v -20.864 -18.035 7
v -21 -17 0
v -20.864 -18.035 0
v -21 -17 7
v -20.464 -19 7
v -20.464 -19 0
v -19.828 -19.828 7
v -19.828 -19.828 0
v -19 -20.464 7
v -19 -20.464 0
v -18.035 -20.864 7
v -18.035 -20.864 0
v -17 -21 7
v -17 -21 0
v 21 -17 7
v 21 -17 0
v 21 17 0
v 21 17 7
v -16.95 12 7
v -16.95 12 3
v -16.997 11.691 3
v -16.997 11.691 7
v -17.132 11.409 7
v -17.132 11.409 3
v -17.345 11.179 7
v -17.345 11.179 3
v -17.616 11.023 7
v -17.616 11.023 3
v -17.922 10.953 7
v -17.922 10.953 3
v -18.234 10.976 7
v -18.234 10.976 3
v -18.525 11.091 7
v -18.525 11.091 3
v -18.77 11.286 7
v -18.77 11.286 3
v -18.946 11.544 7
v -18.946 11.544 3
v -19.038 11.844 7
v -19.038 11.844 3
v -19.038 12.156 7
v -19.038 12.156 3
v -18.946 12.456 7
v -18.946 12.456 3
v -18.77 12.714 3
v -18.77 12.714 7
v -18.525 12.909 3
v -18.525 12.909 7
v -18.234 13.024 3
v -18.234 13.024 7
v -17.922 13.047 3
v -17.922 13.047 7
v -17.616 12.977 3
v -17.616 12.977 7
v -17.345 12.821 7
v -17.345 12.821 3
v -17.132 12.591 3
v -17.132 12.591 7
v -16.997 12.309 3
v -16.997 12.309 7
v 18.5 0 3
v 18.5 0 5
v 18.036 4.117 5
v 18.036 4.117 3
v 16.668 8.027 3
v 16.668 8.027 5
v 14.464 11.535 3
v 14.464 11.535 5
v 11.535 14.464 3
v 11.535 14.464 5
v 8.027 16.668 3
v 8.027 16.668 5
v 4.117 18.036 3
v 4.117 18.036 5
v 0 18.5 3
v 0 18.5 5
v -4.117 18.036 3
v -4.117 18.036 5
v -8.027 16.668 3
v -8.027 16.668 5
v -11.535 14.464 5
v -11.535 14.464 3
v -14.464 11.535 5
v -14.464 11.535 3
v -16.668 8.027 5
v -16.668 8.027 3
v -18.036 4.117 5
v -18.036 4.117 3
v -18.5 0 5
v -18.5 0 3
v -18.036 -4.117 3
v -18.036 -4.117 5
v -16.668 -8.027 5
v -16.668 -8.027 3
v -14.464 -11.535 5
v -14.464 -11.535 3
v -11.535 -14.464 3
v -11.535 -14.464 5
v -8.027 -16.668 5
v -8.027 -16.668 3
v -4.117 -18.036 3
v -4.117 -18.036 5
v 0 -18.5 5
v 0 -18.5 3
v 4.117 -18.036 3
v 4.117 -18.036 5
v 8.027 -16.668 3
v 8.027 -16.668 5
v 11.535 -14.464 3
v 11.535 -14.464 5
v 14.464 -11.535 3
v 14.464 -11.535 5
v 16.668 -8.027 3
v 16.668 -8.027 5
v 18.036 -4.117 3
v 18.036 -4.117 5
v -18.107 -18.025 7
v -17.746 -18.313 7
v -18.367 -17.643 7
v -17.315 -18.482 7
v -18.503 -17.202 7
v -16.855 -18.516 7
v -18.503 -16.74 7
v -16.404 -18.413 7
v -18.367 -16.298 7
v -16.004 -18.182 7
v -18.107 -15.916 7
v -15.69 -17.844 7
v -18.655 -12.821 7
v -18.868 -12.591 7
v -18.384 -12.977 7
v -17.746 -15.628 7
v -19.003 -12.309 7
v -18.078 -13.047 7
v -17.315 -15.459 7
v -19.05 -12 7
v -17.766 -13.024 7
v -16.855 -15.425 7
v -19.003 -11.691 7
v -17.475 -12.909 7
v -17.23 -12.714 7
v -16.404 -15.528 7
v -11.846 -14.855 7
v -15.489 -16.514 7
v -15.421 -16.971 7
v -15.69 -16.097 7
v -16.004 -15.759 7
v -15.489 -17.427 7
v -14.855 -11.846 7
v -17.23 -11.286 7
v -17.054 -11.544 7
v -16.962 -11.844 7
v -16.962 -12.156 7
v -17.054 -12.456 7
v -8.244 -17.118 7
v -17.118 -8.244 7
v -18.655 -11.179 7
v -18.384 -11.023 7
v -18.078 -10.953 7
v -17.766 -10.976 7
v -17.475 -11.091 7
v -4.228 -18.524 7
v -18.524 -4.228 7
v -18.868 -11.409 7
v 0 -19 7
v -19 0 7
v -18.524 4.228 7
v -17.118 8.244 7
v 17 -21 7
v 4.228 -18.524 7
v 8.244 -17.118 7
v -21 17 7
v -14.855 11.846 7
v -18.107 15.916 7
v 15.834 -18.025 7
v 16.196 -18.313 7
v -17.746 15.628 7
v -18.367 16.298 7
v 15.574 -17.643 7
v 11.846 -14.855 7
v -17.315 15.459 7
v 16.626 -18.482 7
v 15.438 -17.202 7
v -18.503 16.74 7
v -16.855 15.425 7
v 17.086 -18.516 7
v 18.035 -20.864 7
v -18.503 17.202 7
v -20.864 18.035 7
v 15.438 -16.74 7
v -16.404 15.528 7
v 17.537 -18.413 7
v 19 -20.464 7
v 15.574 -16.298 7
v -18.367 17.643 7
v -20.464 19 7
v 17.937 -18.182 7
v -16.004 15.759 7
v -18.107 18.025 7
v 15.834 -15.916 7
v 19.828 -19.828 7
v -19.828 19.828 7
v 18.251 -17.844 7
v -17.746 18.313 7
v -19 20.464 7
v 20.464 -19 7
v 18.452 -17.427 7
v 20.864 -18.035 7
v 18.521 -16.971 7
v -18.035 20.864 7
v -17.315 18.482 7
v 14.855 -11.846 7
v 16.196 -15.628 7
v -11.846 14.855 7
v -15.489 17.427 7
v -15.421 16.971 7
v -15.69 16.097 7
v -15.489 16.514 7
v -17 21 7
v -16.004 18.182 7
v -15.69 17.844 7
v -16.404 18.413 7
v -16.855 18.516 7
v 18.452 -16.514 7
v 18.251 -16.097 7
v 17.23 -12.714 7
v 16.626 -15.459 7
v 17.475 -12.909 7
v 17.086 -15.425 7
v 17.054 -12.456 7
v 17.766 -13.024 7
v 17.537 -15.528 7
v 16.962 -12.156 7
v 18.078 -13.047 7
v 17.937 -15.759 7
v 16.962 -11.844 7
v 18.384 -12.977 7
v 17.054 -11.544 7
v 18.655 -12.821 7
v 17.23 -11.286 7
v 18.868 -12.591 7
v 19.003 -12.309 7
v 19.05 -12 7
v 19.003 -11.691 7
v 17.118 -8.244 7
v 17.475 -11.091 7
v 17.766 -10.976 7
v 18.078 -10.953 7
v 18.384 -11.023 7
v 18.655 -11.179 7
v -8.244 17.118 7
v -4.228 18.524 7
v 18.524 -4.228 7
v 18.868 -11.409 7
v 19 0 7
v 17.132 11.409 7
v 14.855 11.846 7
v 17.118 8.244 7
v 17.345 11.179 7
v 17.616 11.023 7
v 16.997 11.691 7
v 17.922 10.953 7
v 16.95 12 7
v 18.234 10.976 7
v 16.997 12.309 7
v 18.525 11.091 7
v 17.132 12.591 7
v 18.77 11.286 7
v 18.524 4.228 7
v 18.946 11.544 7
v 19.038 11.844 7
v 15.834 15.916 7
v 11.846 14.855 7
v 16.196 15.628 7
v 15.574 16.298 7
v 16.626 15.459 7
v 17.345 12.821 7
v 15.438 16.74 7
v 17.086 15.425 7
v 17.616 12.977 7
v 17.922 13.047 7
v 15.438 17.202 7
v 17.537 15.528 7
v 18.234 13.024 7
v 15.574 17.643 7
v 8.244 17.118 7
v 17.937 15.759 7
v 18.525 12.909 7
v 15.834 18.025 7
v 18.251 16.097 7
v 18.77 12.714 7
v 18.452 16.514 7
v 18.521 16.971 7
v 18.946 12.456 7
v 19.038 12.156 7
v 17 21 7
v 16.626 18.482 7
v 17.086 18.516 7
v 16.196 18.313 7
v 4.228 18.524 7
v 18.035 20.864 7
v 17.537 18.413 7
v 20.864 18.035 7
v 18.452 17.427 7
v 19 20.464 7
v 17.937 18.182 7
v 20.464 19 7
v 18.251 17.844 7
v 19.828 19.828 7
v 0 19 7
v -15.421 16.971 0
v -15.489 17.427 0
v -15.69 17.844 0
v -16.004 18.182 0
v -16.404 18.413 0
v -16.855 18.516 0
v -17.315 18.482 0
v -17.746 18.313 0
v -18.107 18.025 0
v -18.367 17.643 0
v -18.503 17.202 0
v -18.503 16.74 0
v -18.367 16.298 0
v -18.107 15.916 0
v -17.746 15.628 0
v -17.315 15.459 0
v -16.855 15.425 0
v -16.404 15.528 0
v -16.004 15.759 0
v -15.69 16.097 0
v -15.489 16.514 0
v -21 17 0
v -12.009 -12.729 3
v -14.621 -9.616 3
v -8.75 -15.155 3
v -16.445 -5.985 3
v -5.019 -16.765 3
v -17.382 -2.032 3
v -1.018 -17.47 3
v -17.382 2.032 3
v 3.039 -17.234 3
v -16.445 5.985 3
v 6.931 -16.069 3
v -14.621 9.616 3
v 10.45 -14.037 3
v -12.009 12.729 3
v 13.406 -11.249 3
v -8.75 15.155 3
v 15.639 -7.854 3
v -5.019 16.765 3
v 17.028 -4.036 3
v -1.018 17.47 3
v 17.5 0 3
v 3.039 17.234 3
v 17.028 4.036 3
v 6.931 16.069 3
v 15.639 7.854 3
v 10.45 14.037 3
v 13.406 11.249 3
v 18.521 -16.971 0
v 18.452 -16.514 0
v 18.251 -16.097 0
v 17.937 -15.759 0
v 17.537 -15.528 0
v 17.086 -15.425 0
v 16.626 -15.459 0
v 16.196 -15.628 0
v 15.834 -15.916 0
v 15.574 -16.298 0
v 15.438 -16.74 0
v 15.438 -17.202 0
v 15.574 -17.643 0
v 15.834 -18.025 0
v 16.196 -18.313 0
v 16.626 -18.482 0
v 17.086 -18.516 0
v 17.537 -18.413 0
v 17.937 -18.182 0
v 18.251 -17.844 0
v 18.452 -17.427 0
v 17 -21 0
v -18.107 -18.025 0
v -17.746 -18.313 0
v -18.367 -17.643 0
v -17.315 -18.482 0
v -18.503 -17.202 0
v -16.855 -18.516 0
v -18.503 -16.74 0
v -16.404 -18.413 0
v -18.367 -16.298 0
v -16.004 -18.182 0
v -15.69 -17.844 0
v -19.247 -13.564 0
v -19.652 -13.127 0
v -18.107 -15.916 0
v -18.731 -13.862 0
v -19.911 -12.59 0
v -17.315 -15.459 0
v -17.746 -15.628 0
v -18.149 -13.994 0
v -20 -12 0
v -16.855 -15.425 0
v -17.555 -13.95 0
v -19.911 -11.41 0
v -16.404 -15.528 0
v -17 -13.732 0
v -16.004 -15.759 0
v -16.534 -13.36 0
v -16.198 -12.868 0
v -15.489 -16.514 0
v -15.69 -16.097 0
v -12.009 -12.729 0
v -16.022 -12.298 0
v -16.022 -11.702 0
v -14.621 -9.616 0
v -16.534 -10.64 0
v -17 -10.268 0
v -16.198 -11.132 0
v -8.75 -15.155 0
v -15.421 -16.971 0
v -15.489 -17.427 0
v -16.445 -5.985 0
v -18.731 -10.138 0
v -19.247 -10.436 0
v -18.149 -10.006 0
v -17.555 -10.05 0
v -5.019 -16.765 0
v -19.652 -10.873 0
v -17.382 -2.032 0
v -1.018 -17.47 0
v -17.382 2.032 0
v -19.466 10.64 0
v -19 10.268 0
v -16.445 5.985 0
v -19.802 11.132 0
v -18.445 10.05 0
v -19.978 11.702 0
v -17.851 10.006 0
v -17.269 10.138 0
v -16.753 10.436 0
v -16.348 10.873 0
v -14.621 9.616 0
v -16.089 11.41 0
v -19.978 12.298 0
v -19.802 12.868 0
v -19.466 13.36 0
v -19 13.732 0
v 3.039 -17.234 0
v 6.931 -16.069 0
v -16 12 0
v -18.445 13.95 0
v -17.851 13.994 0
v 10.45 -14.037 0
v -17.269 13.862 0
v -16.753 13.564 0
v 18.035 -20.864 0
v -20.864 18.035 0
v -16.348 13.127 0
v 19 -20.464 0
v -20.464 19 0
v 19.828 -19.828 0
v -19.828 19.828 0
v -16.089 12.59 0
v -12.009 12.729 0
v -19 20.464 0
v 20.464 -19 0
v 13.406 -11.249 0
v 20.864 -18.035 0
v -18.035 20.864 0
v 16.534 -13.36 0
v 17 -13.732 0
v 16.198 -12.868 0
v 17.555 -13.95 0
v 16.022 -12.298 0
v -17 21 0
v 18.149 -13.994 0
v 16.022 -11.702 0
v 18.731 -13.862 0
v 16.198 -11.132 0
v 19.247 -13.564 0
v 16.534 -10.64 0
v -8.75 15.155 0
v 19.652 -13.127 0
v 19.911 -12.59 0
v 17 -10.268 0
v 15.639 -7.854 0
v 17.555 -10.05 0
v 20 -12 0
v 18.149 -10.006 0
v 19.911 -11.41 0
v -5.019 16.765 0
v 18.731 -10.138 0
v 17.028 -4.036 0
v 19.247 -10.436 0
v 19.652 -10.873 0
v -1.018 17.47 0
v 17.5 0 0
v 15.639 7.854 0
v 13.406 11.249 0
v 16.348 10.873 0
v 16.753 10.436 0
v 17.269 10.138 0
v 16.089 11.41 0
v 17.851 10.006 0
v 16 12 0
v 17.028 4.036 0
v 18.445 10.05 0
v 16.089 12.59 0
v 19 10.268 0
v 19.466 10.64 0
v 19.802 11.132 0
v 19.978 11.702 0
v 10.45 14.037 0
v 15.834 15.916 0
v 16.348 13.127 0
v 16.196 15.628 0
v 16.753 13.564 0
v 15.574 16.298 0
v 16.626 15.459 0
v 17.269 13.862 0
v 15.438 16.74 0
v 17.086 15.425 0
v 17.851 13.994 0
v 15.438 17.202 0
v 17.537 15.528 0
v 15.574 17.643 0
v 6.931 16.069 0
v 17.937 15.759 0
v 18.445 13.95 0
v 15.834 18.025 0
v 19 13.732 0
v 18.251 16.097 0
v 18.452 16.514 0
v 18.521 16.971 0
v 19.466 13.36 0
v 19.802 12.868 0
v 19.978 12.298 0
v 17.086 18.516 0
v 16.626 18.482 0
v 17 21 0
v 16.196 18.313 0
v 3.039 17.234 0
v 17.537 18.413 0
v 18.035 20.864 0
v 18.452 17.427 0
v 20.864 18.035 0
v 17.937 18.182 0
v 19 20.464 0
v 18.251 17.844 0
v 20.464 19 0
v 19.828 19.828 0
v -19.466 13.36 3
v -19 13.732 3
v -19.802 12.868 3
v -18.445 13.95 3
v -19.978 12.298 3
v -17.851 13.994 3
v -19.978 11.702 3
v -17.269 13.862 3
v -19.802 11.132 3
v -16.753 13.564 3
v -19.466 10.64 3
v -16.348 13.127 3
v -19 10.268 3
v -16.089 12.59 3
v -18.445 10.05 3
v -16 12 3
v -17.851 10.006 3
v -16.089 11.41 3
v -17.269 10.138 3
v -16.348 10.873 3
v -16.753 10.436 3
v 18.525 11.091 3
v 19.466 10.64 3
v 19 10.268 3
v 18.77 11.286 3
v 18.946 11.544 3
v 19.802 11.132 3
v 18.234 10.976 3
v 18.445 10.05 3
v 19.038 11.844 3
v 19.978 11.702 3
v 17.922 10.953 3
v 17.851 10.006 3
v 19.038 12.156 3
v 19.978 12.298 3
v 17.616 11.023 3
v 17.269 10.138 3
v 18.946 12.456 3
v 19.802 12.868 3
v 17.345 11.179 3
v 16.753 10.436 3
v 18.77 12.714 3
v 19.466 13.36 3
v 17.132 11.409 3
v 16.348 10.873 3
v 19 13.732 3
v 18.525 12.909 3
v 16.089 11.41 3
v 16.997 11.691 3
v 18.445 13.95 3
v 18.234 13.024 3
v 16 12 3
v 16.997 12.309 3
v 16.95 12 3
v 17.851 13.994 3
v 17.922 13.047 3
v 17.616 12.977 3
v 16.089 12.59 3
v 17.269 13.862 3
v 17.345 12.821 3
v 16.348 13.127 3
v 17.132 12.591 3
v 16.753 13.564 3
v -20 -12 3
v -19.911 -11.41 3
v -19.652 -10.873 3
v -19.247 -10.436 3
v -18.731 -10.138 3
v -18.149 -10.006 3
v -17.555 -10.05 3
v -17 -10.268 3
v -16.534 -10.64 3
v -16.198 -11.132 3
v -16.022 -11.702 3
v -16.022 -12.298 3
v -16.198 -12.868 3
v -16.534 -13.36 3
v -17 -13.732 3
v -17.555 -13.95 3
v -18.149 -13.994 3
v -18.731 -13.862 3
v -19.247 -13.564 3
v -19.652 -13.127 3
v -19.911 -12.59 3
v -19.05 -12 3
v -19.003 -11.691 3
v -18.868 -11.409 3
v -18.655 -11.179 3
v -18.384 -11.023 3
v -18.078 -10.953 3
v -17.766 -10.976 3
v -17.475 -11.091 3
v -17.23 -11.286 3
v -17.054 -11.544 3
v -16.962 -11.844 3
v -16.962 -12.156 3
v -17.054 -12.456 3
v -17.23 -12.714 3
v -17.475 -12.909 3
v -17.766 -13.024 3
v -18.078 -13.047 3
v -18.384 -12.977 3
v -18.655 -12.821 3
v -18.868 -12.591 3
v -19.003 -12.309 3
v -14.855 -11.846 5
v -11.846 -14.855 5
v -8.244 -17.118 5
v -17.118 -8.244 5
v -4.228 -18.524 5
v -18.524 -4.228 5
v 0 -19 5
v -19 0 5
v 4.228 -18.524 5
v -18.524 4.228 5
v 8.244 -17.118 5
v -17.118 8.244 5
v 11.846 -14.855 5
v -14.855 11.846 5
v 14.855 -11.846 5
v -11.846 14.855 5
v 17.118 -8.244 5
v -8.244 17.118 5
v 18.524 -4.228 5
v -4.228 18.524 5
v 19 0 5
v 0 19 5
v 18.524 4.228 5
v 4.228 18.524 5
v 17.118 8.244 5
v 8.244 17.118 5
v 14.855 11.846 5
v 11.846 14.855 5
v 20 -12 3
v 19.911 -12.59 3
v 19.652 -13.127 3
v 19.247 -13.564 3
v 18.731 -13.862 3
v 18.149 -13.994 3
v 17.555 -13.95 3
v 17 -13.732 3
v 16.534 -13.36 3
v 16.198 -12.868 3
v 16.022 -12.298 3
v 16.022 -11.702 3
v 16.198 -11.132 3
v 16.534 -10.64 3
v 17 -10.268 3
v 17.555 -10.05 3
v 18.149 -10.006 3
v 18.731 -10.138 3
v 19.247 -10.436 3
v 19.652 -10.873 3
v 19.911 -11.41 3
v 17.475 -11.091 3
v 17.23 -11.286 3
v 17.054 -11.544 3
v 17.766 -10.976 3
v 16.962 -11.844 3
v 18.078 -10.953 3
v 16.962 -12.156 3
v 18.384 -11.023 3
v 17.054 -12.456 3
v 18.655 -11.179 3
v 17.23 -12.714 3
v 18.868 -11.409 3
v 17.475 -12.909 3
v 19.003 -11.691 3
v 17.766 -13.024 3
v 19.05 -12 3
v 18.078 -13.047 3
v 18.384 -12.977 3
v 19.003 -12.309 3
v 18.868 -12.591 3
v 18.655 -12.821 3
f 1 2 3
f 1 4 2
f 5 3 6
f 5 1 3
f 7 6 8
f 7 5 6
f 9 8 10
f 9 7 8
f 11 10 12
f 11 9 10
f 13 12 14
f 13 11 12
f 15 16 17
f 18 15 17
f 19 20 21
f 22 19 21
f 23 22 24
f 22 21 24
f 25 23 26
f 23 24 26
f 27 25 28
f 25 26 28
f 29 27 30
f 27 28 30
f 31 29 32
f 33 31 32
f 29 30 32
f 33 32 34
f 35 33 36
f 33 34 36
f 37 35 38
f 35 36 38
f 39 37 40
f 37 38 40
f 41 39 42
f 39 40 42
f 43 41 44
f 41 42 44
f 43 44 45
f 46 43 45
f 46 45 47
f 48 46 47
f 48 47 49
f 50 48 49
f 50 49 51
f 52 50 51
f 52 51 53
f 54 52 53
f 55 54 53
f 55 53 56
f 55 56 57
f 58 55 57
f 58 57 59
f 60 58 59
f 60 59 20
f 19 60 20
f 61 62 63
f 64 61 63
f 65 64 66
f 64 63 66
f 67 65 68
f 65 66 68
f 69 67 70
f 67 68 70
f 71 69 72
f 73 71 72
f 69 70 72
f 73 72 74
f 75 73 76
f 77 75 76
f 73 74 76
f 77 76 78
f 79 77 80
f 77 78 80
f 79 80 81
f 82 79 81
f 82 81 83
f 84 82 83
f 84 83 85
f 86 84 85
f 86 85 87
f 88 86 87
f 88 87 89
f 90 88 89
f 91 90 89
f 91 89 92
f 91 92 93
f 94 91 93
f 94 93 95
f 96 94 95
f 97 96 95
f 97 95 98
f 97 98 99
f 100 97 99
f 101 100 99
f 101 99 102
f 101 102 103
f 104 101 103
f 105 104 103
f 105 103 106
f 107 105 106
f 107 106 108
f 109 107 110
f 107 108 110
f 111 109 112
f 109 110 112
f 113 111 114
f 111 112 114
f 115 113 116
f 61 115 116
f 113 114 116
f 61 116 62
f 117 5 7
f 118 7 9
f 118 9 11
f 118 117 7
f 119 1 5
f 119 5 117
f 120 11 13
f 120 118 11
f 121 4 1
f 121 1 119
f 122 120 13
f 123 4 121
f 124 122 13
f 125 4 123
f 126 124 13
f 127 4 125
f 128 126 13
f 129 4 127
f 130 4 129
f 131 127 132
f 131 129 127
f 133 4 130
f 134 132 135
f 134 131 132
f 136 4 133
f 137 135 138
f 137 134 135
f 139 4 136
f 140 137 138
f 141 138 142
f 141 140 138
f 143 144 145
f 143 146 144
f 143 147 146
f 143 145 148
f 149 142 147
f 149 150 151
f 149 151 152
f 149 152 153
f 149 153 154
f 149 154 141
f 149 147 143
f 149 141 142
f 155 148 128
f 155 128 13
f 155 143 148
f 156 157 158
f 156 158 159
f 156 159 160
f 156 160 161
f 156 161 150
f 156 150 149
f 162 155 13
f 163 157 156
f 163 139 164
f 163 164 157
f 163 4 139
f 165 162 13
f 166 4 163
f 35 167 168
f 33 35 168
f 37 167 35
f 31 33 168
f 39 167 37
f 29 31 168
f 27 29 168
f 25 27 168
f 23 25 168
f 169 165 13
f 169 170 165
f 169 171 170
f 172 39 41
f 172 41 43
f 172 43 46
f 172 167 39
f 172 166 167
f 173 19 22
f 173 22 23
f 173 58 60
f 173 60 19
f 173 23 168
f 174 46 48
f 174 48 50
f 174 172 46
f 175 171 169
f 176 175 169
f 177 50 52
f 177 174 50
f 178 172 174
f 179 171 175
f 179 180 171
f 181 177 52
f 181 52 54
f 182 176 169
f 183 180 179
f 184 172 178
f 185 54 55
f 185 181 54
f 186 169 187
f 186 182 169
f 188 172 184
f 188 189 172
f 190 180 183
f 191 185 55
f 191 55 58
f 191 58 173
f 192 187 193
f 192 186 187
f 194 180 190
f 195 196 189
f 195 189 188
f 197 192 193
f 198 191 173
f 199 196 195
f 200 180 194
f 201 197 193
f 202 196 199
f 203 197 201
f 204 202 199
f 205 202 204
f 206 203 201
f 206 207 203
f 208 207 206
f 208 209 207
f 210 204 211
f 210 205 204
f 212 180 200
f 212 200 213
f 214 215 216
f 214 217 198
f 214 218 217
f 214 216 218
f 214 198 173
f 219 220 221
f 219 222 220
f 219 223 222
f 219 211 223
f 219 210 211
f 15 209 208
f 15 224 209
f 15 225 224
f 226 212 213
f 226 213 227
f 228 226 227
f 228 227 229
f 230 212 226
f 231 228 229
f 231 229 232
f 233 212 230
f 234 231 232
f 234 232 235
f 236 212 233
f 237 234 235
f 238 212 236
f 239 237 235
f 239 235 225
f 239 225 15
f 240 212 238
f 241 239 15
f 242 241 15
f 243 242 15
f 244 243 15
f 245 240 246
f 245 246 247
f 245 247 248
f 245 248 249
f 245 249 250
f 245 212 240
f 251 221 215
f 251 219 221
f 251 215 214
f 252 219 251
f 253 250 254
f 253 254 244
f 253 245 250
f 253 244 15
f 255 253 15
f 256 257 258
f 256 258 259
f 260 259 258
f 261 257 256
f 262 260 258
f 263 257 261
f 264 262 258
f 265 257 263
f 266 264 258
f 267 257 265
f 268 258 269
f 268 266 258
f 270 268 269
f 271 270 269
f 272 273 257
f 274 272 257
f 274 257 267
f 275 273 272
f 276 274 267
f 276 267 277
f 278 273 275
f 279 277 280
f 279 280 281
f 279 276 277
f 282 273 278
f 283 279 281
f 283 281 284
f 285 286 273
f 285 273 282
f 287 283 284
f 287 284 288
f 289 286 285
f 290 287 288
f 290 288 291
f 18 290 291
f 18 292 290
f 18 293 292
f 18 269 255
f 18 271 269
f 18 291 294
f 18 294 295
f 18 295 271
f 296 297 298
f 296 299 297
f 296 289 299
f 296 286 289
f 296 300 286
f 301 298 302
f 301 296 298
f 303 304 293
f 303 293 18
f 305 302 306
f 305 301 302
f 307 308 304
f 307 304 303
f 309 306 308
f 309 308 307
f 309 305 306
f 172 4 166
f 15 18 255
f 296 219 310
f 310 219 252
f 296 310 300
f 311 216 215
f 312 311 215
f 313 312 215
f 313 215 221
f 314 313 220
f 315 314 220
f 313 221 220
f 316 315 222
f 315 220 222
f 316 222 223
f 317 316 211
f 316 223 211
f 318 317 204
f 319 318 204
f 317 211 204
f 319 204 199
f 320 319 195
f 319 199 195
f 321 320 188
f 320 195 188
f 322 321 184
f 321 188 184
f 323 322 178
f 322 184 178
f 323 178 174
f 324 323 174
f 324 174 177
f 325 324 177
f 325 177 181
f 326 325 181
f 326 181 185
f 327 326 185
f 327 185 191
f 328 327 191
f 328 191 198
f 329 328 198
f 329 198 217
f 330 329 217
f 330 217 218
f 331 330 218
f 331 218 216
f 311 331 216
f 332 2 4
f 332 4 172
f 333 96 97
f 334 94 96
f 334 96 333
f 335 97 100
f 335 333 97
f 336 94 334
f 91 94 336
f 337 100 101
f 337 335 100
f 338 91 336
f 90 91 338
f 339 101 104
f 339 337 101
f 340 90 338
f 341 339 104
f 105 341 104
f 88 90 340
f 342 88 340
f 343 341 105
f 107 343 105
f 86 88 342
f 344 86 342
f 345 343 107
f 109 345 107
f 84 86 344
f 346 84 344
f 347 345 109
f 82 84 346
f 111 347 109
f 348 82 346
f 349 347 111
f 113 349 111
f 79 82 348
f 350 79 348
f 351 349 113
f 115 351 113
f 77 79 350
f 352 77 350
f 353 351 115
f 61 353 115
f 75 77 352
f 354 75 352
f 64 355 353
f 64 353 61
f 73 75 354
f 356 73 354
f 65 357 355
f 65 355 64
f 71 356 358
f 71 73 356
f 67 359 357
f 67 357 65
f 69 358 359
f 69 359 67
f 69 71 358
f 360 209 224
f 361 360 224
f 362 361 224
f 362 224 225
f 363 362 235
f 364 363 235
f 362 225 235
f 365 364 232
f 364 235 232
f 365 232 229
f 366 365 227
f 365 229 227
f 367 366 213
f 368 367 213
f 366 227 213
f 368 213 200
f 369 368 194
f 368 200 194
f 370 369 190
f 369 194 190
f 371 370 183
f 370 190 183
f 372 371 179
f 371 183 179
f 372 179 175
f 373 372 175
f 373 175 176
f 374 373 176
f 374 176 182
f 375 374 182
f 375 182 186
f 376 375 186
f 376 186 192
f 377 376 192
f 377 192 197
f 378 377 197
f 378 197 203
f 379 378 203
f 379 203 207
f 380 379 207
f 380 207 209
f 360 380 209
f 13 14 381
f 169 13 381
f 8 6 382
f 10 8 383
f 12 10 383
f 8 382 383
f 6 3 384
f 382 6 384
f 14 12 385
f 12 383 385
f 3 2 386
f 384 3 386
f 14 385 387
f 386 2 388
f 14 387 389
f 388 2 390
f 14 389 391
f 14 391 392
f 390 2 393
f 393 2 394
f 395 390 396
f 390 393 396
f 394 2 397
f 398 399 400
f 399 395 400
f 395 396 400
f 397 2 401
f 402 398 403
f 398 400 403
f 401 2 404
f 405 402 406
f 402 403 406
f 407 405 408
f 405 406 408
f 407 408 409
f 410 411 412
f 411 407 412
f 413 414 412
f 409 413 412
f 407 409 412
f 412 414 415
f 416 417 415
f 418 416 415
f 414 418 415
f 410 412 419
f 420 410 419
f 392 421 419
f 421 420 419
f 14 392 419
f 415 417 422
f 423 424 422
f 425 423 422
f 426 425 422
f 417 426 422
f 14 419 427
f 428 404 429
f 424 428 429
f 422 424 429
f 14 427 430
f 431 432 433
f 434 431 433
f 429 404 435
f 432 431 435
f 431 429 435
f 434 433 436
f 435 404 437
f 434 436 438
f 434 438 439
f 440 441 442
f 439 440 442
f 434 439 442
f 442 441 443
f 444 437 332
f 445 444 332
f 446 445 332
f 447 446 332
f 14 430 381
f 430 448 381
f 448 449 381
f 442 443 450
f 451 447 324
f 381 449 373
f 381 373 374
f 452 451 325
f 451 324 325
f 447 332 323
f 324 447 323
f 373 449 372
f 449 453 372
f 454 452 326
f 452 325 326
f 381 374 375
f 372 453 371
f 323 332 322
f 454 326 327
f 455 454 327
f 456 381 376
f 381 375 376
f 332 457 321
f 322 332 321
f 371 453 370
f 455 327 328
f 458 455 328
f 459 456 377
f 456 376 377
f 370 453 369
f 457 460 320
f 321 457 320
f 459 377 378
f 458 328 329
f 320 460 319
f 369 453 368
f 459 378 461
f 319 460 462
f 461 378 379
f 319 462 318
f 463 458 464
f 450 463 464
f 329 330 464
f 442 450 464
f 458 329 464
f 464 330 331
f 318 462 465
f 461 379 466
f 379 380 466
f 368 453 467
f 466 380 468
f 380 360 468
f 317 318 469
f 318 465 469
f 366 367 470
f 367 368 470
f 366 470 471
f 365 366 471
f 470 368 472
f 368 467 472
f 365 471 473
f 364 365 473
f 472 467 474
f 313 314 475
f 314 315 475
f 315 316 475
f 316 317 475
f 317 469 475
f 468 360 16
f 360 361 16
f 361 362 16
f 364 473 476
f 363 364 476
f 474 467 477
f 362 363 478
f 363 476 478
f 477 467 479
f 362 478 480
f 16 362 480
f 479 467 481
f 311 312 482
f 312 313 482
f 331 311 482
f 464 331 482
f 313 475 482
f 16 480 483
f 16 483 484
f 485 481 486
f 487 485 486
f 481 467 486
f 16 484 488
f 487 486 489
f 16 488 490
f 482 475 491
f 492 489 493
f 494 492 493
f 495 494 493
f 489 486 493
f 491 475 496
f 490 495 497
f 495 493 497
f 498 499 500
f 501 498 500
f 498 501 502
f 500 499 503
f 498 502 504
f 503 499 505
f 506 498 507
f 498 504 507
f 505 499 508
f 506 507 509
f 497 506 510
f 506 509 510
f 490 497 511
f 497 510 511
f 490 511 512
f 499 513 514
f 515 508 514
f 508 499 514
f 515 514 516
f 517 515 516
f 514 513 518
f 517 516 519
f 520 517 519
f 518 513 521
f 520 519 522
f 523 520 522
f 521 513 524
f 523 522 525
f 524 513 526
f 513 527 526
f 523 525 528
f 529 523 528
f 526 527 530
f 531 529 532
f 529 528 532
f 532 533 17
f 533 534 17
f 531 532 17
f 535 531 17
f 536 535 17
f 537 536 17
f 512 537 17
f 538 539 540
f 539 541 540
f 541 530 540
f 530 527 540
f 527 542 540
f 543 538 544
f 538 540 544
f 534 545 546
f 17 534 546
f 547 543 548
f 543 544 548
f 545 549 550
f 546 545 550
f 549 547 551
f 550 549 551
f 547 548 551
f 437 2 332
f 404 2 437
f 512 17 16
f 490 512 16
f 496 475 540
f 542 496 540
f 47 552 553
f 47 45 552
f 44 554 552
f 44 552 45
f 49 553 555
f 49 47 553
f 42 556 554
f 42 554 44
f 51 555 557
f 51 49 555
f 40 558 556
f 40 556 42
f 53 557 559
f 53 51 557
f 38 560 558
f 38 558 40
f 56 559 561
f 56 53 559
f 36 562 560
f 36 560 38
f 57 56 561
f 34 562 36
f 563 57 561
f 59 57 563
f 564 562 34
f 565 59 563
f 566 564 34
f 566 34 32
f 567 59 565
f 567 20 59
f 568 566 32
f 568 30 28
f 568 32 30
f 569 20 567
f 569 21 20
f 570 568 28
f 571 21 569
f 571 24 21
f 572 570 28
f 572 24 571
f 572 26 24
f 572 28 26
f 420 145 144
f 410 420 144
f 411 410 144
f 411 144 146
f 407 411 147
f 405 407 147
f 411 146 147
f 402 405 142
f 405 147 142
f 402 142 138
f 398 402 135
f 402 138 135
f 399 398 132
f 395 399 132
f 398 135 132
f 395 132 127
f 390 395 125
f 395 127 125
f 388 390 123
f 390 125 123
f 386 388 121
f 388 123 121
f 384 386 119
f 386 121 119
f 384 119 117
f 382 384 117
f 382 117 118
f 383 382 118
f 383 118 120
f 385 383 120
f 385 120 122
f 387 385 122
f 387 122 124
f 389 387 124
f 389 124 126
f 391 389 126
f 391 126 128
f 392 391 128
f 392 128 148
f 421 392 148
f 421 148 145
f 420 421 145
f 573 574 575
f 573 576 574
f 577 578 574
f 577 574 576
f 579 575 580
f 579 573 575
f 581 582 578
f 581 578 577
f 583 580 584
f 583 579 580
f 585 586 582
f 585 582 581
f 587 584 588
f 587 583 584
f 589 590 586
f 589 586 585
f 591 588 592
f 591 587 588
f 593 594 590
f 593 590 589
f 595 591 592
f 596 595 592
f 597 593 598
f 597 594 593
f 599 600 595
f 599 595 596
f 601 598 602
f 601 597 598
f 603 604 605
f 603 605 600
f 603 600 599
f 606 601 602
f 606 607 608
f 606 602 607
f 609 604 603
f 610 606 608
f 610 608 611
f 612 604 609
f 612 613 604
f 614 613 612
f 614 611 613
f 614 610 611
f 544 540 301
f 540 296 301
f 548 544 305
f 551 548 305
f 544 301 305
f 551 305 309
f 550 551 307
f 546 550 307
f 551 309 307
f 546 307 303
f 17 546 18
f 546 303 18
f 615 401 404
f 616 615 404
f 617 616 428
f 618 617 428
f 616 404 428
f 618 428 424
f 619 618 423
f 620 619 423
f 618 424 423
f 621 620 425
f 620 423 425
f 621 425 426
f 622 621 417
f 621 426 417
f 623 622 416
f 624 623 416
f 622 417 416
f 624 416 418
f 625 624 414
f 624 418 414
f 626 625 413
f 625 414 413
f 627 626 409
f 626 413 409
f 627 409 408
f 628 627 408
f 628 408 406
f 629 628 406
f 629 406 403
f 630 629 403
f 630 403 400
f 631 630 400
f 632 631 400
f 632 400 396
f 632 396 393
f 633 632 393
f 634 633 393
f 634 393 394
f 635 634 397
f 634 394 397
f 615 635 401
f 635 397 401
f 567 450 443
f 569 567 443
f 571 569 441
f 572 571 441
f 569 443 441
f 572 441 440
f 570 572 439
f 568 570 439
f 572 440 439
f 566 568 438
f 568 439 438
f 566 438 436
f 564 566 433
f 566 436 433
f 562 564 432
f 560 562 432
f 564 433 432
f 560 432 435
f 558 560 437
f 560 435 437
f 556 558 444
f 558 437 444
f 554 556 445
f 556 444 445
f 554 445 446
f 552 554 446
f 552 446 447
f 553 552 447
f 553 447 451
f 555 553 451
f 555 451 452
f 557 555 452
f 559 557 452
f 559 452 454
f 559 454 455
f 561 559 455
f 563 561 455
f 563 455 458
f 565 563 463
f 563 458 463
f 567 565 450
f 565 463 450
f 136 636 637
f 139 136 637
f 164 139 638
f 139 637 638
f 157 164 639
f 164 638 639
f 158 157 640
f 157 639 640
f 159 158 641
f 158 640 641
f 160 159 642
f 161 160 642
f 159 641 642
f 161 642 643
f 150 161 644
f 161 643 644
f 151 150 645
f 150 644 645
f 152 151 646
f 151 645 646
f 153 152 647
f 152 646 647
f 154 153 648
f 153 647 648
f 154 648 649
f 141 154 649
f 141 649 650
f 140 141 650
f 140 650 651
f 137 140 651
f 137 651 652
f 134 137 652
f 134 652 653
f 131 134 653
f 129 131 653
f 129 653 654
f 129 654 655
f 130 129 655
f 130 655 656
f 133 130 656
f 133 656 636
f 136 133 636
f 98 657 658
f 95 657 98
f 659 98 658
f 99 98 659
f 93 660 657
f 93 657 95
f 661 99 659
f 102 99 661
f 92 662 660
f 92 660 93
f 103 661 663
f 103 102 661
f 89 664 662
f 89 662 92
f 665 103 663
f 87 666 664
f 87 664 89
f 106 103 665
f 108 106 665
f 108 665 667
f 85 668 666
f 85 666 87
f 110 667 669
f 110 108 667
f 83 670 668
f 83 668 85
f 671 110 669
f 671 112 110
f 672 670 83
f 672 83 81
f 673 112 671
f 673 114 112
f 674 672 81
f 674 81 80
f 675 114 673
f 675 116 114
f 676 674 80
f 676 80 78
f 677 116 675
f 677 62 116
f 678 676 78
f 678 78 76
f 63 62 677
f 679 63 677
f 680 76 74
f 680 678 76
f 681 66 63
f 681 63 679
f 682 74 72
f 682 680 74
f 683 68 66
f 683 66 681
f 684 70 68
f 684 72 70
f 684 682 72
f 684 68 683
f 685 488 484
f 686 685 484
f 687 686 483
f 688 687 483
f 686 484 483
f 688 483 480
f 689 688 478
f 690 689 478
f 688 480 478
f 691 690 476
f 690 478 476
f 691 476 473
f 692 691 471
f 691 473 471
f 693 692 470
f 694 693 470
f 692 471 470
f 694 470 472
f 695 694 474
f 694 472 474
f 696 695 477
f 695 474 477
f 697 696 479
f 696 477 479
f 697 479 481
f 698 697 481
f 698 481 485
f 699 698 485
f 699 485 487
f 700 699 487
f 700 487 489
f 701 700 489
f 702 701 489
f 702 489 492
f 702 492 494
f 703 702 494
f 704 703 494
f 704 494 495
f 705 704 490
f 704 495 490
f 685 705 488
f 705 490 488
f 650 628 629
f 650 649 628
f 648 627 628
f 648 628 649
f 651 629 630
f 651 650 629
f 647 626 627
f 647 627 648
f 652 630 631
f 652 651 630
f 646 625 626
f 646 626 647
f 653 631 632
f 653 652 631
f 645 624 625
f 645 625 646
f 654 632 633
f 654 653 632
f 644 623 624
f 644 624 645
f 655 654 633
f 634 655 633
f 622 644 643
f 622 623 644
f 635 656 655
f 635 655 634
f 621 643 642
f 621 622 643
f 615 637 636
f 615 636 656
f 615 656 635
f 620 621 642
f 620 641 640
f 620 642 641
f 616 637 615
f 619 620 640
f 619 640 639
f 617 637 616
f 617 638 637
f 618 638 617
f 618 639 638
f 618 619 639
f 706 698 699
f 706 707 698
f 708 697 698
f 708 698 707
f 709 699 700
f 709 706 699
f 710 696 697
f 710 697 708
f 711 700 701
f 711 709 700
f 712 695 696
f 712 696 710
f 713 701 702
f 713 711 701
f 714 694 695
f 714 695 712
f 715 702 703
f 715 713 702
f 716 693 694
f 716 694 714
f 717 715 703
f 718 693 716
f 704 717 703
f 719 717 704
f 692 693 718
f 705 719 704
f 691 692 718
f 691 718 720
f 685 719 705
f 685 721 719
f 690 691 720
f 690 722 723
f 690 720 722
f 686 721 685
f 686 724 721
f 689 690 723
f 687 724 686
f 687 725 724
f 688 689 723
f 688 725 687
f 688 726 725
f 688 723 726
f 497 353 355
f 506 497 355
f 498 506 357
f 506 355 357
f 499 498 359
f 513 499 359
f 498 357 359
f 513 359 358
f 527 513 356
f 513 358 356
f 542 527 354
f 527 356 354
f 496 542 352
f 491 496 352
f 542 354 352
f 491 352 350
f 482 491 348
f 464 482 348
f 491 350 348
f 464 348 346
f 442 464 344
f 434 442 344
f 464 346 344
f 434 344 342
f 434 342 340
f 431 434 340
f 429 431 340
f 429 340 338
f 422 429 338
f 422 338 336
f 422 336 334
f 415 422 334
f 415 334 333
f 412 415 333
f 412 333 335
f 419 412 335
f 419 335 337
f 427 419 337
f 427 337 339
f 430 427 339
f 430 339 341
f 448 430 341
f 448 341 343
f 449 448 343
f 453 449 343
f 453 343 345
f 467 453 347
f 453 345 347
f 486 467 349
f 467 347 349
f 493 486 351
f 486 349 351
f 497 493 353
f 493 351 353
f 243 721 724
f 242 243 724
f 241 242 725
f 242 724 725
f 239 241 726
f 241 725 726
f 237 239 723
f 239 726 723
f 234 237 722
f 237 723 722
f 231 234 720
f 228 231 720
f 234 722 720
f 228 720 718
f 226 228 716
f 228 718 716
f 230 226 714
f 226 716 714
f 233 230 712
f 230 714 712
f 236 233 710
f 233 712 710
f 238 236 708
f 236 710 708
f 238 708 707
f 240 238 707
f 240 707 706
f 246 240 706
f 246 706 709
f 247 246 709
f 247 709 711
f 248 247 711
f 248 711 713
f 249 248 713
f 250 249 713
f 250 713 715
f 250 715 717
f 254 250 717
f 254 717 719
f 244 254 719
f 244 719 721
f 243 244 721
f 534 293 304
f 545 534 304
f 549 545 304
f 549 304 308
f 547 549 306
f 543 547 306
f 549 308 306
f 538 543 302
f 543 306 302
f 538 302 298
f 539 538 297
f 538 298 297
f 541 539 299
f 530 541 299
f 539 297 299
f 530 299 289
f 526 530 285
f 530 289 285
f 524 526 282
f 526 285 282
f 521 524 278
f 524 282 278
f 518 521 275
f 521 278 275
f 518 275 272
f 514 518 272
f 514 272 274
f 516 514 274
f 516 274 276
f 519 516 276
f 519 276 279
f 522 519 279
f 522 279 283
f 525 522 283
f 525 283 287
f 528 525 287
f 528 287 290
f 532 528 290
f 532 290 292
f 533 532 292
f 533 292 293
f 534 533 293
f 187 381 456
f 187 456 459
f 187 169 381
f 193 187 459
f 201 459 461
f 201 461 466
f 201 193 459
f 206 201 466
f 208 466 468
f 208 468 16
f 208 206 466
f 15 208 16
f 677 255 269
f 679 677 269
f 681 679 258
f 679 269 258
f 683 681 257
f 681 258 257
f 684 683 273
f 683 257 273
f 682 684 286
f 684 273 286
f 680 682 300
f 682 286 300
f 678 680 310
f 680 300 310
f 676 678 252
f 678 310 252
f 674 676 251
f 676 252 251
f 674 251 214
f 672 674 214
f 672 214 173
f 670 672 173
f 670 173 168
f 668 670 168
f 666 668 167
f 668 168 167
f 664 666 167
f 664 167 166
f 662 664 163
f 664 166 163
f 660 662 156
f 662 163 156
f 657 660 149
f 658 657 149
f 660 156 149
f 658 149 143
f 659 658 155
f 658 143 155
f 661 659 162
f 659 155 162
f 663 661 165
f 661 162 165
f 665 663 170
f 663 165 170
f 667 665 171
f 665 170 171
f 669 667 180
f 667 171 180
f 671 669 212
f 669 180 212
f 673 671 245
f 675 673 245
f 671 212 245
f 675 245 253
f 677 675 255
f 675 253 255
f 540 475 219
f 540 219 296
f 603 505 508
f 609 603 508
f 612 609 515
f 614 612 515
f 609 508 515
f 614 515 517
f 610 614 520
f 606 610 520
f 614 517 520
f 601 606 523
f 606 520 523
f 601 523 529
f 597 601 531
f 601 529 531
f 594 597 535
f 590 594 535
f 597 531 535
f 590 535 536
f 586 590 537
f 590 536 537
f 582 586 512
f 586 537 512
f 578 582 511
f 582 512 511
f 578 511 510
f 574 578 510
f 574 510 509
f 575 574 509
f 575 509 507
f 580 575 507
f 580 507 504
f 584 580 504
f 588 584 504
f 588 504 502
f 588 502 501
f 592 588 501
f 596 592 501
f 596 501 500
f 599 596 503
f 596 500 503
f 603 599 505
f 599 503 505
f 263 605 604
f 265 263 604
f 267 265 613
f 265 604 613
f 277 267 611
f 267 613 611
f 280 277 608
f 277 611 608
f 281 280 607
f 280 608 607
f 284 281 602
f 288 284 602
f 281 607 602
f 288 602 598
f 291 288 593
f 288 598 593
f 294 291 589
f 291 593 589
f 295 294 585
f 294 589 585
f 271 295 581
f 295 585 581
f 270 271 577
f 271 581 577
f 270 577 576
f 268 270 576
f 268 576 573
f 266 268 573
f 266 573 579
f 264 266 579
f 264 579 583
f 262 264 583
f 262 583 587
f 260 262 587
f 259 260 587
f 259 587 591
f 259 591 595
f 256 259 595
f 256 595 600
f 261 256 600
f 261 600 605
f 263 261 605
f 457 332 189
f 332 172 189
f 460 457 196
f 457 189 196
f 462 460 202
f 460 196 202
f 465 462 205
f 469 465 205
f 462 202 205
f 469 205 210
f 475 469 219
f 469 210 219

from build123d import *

# Parameters (mm, degrees)
SKETCH_1_W          = 42
SKETCH_1_H          = 42
EXTRUDE_1_DEPTH     = 7
SKETCH_2_R          = 17.5
CUT_EXTRUDE_1_DEPTH = 31.512292605
SKETCH_3_R          = 18.5
CUT_EXTRUDE_2_DEPTH = 4
SKETCH_4_R          = 19
CUT_EXTRUDE_3_DEPTH = 2
FILLET_1_R          = 4
SKETCH_5_R          = 1.55
CUT_EXTRUDE_4_DEPTH = 31.512292605
SKETCH_7_R          = 1.05
CUT_EXTRUDE_5_DEPTH = 31.512292605
SKETCH_8_R          = 2
CUT_EXTRUDE_6_DEPTH = 3


with BuildPart() as part:
    # 草图1 → 凸台-拉伸1 (new body)
    with BuildSketch(Plane.XY):
        Rectangle(SKETCH_1_W, SKETCH_1_H)
    extrude(amount=EXTRUDE_1_DEPTH)

    # 草图2 → 切除-拉伸1 (cut, through all)
    with BuildSketch(Plane.XY.offset(7)):
        Circle(SKETCH_2_R)
    extrude(amount=-CUT_EXTRUDE_1_DEPTH, mode=Mode.SUBTRACT)

    # 草图3 → 切除-拉伸2 (cut)
    with BuildSketch(Plane.XY.offset(7)):
        Circle(SKETCH_3_R)
    extrude(amount=-CUT_EXTRUDE_2_DEPTH, mode=Mode.SUBTRACT)

    # 草图4 → 切除-拉伸3 (cut)
    with BuildSketch(Plane.XY.offset(7)):
        Circle(SKETCH_4_R)
    extrude(amount=-CUT_EXTRUDE_3_DEPTH, mode=Mode.SUBTRACT)

    # 圆角1
    fillet_1_edges = [part.edges().sort_by_distance(p)[0] for p in [
        (21, -21, 3.5),
        (-21, -21, 3.5),
        (-21, 21, 3.5),
        (21, 21, 3.5),
    ]]
    fillet(fillet_1_edges, radius=FILLET_1_R)

    # 草图5 → 切除-拉伸4 (cut, through all)
    with BuildSketch(Plane.XY.offset(7)):
        with Locations((-16.970562748, 16.970562748)):
            Circle(SKETCH_5_R)
        with Locations((16.970562748, 16.970562748)):
            Circle(SKETCH_5_R)
        with Locations((16.970562748, -16.970562748)):
            Circle(SKETCH_5_R)
        with Locations((-16.970562748, -16.970562748)):
            Circle(SKETCH_5_R)
    extrude(amount=-CUT_EXTRUDE_4_DEPTH, mode=Mode.SUBTRACT)

    # 草图7 → 切除-拉伸5 (cut, through all)
    with BuildSketch(Plane(origin=(0, 0, 0), x_dir=(-1, 0, 0), z_dir=(0, 0, -1))):
        with Locations((-18, 12)):
            Circle(SKETCH_7_R)
        with Locations(Location((18, 12, 0), (0, 0, 180))):
            Circle(SKETCH_7_R)
        with Locations((18, -12)):
            Circle(SKETCH_7_R)
        with Locations(Location((-18, -12, 0), (0, 0, 180))):
            Circle(SKETCH_7_R)
    extrude(amount=-CUT_EXTRUDE_5_DEPTH, mode=Mode.SUBTRACT)

    # 草图8 → 切除-拉伸6 (cut)
    with BuildSketch(Plane(origin=(0, 0, 0), x_dir=(-1, 0, 0), z_dir=(0, 0, -1))):
        with Locations((-18, 12)):
            Circle(SKETCH_8_R)
        with Locations(Location((18, 12, 0), (0, 0, 180))):
            Circle(SKETCH_8_R)
        with Locations((18, -12)):
            Circle(SKETCH_8_R)
        with Locations(Location((-18, -12, 0), (0, 0, 180))):
            Circle(SKETCH_8_R)
    extrude(amount=-CUT_EXTRUDE_6_DEPTH, mode=Mode.SUBTRACT)


solid = part.part
